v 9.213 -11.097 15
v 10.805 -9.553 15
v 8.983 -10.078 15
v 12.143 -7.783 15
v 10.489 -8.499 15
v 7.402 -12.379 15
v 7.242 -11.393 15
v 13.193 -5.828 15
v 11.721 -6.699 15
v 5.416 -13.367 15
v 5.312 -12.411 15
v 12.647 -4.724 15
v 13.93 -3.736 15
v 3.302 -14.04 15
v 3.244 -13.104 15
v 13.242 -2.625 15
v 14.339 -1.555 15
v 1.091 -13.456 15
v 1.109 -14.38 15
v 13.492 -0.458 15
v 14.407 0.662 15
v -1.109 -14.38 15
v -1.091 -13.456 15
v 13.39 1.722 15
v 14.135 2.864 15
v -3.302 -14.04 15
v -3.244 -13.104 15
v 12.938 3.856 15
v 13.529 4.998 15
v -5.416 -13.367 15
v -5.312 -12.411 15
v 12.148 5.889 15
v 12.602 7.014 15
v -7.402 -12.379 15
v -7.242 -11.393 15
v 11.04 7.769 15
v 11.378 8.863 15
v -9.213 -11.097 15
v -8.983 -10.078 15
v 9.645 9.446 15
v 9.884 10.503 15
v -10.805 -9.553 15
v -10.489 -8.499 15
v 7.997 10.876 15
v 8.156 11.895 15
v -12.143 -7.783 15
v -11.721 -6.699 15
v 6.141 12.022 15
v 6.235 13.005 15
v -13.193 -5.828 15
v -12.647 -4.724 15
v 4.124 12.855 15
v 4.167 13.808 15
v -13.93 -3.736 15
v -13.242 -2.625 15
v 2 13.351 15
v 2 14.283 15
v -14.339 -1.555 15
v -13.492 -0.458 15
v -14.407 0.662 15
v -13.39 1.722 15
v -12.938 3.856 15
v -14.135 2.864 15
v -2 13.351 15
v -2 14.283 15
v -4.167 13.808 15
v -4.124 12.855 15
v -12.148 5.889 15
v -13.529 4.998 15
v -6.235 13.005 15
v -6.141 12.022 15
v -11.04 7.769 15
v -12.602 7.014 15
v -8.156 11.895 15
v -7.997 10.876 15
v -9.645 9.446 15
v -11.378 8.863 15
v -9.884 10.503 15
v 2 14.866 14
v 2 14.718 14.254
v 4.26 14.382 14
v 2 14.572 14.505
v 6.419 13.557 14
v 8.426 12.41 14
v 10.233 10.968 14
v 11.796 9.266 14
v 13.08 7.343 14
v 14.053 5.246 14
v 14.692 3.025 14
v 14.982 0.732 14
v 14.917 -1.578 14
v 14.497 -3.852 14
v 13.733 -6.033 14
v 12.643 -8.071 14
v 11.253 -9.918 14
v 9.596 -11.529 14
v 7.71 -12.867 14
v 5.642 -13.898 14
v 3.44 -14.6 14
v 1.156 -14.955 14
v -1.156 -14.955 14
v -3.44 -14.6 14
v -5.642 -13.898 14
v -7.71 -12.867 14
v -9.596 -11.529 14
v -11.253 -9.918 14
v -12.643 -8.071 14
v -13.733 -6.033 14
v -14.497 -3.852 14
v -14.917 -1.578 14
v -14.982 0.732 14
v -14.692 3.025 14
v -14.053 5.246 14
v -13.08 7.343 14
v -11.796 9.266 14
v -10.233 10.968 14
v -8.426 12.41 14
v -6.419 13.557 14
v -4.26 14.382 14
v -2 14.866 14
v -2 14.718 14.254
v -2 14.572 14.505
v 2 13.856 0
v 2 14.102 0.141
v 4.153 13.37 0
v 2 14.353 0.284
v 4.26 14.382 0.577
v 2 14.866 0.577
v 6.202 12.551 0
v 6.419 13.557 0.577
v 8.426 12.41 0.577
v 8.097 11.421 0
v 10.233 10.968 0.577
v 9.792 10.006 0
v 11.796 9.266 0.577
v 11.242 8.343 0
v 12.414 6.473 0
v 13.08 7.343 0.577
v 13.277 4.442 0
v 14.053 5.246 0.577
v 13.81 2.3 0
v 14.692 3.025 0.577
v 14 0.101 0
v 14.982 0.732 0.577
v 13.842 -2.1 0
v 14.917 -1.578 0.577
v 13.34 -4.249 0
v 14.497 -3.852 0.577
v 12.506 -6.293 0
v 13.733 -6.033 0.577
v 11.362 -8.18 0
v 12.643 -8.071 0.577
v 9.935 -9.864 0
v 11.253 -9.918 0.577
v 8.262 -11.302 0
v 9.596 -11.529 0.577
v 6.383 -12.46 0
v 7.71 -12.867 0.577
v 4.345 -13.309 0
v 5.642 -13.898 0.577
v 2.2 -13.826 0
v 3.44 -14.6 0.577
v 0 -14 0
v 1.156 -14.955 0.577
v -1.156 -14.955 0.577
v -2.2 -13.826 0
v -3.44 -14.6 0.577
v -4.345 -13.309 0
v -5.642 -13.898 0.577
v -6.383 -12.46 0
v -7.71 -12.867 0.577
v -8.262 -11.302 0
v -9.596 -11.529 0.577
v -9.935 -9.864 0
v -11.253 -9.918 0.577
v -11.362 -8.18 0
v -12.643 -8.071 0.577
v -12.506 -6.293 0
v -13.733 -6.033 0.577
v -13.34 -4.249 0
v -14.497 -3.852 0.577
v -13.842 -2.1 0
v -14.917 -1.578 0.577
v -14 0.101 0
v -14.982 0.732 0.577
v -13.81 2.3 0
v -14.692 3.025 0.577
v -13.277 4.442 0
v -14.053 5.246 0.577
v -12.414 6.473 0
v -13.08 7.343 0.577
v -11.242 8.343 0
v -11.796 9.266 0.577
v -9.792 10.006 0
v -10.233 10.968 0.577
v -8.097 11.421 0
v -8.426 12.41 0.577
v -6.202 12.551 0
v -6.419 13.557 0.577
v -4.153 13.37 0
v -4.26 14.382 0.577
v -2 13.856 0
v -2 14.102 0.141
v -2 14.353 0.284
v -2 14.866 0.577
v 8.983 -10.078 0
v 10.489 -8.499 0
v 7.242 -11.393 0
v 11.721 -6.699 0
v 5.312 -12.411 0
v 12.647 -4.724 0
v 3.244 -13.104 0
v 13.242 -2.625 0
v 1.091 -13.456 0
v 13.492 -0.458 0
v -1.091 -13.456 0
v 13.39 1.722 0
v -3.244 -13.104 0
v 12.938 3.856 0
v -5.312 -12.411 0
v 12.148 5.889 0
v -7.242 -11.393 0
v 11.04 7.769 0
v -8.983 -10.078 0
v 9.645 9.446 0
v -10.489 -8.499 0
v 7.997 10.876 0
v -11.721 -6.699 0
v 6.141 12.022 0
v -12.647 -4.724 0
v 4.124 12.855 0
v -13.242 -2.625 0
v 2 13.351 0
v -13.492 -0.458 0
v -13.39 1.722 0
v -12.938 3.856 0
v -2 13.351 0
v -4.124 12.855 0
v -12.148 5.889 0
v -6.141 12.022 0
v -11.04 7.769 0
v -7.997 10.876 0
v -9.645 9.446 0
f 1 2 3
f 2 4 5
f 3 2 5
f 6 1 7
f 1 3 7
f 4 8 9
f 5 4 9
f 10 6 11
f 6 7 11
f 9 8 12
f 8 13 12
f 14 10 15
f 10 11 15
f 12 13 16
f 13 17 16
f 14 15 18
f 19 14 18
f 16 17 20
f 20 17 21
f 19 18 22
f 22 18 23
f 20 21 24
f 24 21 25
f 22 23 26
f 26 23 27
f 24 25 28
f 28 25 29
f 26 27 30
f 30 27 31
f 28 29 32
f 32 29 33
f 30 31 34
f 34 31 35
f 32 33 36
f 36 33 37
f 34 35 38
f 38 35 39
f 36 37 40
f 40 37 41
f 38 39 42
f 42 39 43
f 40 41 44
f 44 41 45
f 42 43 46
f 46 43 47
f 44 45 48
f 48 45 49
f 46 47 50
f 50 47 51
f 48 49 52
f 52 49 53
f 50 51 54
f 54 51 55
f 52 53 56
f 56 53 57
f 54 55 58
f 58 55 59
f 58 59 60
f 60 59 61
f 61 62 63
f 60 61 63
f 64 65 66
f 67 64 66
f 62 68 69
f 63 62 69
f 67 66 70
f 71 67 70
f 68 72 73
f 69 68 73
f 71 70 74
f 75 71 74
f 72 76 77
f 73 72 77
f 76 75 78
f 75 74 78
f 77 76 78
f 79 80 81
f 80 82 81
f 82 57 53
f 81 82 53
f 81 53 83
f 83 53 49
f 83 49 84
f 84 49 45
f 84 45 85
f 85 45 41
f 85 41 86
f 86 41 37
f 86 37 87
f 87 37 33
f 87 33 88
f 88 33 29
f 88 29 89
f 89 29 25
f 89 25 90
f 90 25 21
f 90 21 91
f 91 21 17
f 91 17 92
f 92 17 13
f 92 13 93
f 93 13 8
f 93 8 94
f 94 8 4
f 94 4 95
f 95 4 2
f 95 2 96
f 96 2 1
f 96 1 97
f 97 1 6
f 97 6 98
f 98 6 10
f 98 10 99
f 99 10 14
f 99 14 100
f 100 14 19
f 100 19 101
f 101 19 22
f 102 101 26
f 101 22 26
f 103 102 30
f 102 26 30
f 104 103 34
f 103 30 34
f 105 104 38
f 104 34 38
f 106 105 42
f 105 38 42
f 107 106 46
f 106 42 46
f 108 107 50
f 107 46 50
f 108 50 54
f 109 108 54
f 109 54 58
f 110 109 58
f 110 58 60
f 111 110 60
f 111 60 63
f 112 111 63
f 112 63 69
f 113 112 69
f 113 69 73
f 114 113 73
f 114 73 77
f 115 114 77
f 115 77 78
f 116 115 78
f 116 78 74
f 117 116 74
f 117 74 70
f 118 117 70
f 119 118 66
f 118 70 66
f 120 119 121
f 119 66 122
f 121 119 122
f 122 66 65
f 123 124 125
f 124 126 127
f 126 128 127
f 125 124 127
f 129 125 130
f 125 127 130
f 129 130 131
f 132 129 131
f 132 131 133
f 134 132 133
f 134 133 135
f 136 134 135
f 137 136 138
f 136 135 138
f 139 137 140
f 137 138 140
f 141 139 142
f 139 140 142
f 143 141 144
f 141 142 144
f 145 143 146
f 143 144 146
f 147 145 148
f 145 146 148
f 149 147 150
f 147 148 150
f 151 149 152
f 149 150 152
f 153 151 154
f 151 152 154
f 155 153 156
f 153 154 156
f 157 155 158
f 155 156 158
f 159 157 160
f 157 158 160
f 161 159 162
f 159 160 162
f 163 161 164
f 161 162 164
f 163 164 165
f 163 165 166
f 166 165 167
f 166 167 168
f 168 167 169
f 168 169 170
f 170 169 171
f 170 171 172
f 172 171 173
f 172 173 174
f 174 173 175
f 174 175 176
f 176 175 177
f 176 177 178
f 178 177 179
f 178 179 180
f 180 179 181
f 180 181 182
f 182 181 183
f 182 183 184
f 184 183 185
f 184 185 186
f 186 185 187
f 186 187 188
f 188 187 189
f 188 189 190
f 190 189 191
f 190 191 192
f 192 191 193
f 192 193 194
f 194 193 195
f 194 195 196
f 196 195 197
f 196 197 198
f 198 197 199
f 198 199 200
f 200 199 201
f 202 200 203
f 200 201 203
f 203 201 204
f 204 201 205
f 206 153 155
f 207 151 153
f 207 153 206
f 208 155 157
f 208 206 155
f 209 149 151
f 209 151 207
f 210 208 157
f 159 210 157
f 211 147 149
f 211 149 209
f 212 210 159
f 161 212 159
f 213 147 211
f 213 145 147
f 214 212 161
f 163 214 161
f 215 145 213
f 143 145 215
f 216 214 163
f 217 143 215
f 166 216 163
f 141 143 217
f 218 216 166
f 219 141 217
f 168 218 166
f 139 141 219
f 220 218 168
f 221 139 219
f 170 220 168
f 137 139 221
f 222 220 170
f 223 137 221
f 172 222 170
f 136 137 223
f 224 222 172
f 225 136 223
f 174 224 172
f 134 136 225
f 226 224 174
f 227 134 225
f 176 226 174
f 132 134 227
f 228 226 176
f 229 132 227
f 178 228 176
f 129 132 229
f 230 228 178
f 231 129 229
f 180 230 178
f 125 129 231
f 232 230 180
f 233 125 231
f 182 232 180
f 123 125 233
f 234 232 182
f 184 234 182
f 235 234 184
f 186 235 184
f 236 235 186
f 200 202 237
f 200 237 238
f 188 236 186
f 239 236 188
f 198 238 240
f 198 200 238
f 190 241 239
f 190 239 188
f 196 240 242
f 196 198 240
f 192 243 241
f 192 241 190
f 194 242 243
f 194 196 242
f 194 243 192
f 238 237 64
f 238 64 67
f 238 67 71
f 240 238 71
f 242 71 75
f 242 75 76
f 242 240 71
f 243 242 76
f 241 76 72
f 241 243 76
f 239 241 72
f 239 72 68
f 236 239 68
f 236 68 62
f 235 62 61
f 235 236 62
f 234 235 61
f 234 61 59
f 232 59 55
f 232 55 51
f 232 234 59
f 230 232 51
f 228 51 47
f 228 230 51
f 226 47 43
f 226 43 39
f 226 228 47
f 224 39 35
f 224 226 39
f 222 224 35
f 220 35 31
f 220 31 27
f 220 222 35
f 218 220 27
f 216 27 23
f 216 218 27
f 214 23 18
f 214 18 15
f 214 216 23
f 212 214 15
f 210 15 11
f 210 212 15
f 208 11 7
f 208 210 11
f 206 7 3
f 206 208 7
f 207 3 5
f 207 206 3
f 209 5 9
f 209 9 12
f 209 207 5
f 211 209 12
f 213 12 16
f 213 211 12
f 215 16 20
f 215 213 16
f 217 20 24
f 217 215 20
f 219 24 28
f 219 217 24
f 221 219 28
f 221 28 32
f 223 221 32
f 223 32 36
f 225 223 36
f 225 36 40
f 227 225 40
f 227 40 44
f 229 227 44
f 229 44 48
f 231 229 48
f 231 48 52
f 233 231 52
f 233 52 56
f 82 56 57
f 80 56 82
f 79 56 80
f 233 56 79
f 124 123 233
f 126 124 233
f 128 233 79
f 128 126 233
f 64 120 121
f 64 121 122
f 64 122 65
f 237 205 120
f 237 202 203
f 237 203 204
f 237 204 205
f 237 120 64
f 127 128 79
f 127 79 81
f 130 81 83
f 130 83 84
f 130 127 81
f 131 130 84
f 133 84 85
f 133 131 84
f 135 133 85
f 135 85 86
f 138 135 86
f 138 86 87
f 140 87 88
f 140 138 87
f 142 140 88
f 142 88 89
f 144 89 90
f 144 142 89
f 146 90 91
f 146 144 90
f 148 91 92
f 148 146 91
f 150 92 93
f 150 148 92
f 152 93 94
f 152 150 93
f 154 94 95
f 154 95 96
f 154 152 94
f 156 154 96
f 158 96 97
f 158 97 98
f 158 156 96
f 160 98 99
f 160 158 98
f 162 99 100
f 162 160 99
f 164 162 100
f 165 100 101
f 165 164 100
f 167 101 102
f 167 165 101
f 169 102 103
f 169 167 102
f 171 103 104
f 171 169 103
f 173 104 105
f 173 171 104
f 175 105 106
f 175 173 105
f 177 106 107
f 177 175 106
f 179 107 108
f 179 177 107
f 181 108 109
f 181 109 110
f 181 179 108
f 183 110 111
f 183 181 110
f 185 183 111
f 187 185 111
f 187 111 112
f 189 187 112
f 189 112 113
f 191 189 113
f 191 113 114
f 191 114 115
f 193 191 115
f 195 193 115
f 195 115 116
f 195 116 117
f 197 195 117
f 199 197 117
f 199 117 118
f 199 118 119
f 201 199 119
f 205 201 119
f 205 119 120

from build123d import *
from OCP.BRepFilletAPI import BRepFilletAPI_MakeChamfer

# Parameters (mm, degrees)
EXTRUSION1_DEPTH = 15
CHANFREIN1_SIZE  = 1
CHANFREIN1_SIZE2 = 0.577350269


with BuildPart() as part:
    # Esquisse1 → Extrusion1 (new body)
    with BuildSketch(Plane.XY):
        with BuildLine():
            Line((-2, 14.866068747), (-2, 13.351029923))
            ThreePointArc((-2, 13.351029923), (0, -13.5), (2, 13.351029923))
            Line((2, 13.351029923), (2, 14.866068747))
            ThreePointArc((2, 14.866068747), (0, -15), (-2, 14.866068747))
        make_face()
    extrude(amount=EXTRUSION1_DEPTH)

    # Chanfrein1: one chamfer whose edges measure the first distance from different faces: ONE call of the kernel's chamfer builder (chamfer() names one face for all edges)
    chanfrein1_edges_1 = [part.edges().sort_by_distance(p)[0] for p in [
        (0, -15, 15),
    ]]
    chanfrein1_side_1 = [part.faces().sort_by_distance(p)[0] for p in [
        (0, -15, 7.5),
    ]]
    chanfrein1_edges_2 = [part.edges().sort_by_distance(p)[0] for p in [
        (0, -15, 0),
    ]]
    chanfrein1_side_2 = [part.faces().sort_by_distance(p)[0] for p in [
        (2.423318091, 14.108549335, 0),
    ]]
    chanfrein1 = BRepFilletAPI_MakeChamfer(part.part.solid().wrapped)
    for e in chanfrein1_edges_1:
        chanfrein1.Add(CHANFREIN1_SIZE, CHANFREIN1_SIZE2, e.wrapped, chanfrein1_side_1[0].wrapped)  # the first distance lies on this face
    for e in chanfrein1_edges_2:
        chanfrein1.Add(CHANFREIN1_SIZE, CHANFREIN1_SIZE2, e.wrapped, chanfrein1_side_2[0].wrapped)  # the first distance lies on this face
    add(Compound.cast(chanfrein1.Shape()), mode=Mode.REPLACE)


solid = part.part
